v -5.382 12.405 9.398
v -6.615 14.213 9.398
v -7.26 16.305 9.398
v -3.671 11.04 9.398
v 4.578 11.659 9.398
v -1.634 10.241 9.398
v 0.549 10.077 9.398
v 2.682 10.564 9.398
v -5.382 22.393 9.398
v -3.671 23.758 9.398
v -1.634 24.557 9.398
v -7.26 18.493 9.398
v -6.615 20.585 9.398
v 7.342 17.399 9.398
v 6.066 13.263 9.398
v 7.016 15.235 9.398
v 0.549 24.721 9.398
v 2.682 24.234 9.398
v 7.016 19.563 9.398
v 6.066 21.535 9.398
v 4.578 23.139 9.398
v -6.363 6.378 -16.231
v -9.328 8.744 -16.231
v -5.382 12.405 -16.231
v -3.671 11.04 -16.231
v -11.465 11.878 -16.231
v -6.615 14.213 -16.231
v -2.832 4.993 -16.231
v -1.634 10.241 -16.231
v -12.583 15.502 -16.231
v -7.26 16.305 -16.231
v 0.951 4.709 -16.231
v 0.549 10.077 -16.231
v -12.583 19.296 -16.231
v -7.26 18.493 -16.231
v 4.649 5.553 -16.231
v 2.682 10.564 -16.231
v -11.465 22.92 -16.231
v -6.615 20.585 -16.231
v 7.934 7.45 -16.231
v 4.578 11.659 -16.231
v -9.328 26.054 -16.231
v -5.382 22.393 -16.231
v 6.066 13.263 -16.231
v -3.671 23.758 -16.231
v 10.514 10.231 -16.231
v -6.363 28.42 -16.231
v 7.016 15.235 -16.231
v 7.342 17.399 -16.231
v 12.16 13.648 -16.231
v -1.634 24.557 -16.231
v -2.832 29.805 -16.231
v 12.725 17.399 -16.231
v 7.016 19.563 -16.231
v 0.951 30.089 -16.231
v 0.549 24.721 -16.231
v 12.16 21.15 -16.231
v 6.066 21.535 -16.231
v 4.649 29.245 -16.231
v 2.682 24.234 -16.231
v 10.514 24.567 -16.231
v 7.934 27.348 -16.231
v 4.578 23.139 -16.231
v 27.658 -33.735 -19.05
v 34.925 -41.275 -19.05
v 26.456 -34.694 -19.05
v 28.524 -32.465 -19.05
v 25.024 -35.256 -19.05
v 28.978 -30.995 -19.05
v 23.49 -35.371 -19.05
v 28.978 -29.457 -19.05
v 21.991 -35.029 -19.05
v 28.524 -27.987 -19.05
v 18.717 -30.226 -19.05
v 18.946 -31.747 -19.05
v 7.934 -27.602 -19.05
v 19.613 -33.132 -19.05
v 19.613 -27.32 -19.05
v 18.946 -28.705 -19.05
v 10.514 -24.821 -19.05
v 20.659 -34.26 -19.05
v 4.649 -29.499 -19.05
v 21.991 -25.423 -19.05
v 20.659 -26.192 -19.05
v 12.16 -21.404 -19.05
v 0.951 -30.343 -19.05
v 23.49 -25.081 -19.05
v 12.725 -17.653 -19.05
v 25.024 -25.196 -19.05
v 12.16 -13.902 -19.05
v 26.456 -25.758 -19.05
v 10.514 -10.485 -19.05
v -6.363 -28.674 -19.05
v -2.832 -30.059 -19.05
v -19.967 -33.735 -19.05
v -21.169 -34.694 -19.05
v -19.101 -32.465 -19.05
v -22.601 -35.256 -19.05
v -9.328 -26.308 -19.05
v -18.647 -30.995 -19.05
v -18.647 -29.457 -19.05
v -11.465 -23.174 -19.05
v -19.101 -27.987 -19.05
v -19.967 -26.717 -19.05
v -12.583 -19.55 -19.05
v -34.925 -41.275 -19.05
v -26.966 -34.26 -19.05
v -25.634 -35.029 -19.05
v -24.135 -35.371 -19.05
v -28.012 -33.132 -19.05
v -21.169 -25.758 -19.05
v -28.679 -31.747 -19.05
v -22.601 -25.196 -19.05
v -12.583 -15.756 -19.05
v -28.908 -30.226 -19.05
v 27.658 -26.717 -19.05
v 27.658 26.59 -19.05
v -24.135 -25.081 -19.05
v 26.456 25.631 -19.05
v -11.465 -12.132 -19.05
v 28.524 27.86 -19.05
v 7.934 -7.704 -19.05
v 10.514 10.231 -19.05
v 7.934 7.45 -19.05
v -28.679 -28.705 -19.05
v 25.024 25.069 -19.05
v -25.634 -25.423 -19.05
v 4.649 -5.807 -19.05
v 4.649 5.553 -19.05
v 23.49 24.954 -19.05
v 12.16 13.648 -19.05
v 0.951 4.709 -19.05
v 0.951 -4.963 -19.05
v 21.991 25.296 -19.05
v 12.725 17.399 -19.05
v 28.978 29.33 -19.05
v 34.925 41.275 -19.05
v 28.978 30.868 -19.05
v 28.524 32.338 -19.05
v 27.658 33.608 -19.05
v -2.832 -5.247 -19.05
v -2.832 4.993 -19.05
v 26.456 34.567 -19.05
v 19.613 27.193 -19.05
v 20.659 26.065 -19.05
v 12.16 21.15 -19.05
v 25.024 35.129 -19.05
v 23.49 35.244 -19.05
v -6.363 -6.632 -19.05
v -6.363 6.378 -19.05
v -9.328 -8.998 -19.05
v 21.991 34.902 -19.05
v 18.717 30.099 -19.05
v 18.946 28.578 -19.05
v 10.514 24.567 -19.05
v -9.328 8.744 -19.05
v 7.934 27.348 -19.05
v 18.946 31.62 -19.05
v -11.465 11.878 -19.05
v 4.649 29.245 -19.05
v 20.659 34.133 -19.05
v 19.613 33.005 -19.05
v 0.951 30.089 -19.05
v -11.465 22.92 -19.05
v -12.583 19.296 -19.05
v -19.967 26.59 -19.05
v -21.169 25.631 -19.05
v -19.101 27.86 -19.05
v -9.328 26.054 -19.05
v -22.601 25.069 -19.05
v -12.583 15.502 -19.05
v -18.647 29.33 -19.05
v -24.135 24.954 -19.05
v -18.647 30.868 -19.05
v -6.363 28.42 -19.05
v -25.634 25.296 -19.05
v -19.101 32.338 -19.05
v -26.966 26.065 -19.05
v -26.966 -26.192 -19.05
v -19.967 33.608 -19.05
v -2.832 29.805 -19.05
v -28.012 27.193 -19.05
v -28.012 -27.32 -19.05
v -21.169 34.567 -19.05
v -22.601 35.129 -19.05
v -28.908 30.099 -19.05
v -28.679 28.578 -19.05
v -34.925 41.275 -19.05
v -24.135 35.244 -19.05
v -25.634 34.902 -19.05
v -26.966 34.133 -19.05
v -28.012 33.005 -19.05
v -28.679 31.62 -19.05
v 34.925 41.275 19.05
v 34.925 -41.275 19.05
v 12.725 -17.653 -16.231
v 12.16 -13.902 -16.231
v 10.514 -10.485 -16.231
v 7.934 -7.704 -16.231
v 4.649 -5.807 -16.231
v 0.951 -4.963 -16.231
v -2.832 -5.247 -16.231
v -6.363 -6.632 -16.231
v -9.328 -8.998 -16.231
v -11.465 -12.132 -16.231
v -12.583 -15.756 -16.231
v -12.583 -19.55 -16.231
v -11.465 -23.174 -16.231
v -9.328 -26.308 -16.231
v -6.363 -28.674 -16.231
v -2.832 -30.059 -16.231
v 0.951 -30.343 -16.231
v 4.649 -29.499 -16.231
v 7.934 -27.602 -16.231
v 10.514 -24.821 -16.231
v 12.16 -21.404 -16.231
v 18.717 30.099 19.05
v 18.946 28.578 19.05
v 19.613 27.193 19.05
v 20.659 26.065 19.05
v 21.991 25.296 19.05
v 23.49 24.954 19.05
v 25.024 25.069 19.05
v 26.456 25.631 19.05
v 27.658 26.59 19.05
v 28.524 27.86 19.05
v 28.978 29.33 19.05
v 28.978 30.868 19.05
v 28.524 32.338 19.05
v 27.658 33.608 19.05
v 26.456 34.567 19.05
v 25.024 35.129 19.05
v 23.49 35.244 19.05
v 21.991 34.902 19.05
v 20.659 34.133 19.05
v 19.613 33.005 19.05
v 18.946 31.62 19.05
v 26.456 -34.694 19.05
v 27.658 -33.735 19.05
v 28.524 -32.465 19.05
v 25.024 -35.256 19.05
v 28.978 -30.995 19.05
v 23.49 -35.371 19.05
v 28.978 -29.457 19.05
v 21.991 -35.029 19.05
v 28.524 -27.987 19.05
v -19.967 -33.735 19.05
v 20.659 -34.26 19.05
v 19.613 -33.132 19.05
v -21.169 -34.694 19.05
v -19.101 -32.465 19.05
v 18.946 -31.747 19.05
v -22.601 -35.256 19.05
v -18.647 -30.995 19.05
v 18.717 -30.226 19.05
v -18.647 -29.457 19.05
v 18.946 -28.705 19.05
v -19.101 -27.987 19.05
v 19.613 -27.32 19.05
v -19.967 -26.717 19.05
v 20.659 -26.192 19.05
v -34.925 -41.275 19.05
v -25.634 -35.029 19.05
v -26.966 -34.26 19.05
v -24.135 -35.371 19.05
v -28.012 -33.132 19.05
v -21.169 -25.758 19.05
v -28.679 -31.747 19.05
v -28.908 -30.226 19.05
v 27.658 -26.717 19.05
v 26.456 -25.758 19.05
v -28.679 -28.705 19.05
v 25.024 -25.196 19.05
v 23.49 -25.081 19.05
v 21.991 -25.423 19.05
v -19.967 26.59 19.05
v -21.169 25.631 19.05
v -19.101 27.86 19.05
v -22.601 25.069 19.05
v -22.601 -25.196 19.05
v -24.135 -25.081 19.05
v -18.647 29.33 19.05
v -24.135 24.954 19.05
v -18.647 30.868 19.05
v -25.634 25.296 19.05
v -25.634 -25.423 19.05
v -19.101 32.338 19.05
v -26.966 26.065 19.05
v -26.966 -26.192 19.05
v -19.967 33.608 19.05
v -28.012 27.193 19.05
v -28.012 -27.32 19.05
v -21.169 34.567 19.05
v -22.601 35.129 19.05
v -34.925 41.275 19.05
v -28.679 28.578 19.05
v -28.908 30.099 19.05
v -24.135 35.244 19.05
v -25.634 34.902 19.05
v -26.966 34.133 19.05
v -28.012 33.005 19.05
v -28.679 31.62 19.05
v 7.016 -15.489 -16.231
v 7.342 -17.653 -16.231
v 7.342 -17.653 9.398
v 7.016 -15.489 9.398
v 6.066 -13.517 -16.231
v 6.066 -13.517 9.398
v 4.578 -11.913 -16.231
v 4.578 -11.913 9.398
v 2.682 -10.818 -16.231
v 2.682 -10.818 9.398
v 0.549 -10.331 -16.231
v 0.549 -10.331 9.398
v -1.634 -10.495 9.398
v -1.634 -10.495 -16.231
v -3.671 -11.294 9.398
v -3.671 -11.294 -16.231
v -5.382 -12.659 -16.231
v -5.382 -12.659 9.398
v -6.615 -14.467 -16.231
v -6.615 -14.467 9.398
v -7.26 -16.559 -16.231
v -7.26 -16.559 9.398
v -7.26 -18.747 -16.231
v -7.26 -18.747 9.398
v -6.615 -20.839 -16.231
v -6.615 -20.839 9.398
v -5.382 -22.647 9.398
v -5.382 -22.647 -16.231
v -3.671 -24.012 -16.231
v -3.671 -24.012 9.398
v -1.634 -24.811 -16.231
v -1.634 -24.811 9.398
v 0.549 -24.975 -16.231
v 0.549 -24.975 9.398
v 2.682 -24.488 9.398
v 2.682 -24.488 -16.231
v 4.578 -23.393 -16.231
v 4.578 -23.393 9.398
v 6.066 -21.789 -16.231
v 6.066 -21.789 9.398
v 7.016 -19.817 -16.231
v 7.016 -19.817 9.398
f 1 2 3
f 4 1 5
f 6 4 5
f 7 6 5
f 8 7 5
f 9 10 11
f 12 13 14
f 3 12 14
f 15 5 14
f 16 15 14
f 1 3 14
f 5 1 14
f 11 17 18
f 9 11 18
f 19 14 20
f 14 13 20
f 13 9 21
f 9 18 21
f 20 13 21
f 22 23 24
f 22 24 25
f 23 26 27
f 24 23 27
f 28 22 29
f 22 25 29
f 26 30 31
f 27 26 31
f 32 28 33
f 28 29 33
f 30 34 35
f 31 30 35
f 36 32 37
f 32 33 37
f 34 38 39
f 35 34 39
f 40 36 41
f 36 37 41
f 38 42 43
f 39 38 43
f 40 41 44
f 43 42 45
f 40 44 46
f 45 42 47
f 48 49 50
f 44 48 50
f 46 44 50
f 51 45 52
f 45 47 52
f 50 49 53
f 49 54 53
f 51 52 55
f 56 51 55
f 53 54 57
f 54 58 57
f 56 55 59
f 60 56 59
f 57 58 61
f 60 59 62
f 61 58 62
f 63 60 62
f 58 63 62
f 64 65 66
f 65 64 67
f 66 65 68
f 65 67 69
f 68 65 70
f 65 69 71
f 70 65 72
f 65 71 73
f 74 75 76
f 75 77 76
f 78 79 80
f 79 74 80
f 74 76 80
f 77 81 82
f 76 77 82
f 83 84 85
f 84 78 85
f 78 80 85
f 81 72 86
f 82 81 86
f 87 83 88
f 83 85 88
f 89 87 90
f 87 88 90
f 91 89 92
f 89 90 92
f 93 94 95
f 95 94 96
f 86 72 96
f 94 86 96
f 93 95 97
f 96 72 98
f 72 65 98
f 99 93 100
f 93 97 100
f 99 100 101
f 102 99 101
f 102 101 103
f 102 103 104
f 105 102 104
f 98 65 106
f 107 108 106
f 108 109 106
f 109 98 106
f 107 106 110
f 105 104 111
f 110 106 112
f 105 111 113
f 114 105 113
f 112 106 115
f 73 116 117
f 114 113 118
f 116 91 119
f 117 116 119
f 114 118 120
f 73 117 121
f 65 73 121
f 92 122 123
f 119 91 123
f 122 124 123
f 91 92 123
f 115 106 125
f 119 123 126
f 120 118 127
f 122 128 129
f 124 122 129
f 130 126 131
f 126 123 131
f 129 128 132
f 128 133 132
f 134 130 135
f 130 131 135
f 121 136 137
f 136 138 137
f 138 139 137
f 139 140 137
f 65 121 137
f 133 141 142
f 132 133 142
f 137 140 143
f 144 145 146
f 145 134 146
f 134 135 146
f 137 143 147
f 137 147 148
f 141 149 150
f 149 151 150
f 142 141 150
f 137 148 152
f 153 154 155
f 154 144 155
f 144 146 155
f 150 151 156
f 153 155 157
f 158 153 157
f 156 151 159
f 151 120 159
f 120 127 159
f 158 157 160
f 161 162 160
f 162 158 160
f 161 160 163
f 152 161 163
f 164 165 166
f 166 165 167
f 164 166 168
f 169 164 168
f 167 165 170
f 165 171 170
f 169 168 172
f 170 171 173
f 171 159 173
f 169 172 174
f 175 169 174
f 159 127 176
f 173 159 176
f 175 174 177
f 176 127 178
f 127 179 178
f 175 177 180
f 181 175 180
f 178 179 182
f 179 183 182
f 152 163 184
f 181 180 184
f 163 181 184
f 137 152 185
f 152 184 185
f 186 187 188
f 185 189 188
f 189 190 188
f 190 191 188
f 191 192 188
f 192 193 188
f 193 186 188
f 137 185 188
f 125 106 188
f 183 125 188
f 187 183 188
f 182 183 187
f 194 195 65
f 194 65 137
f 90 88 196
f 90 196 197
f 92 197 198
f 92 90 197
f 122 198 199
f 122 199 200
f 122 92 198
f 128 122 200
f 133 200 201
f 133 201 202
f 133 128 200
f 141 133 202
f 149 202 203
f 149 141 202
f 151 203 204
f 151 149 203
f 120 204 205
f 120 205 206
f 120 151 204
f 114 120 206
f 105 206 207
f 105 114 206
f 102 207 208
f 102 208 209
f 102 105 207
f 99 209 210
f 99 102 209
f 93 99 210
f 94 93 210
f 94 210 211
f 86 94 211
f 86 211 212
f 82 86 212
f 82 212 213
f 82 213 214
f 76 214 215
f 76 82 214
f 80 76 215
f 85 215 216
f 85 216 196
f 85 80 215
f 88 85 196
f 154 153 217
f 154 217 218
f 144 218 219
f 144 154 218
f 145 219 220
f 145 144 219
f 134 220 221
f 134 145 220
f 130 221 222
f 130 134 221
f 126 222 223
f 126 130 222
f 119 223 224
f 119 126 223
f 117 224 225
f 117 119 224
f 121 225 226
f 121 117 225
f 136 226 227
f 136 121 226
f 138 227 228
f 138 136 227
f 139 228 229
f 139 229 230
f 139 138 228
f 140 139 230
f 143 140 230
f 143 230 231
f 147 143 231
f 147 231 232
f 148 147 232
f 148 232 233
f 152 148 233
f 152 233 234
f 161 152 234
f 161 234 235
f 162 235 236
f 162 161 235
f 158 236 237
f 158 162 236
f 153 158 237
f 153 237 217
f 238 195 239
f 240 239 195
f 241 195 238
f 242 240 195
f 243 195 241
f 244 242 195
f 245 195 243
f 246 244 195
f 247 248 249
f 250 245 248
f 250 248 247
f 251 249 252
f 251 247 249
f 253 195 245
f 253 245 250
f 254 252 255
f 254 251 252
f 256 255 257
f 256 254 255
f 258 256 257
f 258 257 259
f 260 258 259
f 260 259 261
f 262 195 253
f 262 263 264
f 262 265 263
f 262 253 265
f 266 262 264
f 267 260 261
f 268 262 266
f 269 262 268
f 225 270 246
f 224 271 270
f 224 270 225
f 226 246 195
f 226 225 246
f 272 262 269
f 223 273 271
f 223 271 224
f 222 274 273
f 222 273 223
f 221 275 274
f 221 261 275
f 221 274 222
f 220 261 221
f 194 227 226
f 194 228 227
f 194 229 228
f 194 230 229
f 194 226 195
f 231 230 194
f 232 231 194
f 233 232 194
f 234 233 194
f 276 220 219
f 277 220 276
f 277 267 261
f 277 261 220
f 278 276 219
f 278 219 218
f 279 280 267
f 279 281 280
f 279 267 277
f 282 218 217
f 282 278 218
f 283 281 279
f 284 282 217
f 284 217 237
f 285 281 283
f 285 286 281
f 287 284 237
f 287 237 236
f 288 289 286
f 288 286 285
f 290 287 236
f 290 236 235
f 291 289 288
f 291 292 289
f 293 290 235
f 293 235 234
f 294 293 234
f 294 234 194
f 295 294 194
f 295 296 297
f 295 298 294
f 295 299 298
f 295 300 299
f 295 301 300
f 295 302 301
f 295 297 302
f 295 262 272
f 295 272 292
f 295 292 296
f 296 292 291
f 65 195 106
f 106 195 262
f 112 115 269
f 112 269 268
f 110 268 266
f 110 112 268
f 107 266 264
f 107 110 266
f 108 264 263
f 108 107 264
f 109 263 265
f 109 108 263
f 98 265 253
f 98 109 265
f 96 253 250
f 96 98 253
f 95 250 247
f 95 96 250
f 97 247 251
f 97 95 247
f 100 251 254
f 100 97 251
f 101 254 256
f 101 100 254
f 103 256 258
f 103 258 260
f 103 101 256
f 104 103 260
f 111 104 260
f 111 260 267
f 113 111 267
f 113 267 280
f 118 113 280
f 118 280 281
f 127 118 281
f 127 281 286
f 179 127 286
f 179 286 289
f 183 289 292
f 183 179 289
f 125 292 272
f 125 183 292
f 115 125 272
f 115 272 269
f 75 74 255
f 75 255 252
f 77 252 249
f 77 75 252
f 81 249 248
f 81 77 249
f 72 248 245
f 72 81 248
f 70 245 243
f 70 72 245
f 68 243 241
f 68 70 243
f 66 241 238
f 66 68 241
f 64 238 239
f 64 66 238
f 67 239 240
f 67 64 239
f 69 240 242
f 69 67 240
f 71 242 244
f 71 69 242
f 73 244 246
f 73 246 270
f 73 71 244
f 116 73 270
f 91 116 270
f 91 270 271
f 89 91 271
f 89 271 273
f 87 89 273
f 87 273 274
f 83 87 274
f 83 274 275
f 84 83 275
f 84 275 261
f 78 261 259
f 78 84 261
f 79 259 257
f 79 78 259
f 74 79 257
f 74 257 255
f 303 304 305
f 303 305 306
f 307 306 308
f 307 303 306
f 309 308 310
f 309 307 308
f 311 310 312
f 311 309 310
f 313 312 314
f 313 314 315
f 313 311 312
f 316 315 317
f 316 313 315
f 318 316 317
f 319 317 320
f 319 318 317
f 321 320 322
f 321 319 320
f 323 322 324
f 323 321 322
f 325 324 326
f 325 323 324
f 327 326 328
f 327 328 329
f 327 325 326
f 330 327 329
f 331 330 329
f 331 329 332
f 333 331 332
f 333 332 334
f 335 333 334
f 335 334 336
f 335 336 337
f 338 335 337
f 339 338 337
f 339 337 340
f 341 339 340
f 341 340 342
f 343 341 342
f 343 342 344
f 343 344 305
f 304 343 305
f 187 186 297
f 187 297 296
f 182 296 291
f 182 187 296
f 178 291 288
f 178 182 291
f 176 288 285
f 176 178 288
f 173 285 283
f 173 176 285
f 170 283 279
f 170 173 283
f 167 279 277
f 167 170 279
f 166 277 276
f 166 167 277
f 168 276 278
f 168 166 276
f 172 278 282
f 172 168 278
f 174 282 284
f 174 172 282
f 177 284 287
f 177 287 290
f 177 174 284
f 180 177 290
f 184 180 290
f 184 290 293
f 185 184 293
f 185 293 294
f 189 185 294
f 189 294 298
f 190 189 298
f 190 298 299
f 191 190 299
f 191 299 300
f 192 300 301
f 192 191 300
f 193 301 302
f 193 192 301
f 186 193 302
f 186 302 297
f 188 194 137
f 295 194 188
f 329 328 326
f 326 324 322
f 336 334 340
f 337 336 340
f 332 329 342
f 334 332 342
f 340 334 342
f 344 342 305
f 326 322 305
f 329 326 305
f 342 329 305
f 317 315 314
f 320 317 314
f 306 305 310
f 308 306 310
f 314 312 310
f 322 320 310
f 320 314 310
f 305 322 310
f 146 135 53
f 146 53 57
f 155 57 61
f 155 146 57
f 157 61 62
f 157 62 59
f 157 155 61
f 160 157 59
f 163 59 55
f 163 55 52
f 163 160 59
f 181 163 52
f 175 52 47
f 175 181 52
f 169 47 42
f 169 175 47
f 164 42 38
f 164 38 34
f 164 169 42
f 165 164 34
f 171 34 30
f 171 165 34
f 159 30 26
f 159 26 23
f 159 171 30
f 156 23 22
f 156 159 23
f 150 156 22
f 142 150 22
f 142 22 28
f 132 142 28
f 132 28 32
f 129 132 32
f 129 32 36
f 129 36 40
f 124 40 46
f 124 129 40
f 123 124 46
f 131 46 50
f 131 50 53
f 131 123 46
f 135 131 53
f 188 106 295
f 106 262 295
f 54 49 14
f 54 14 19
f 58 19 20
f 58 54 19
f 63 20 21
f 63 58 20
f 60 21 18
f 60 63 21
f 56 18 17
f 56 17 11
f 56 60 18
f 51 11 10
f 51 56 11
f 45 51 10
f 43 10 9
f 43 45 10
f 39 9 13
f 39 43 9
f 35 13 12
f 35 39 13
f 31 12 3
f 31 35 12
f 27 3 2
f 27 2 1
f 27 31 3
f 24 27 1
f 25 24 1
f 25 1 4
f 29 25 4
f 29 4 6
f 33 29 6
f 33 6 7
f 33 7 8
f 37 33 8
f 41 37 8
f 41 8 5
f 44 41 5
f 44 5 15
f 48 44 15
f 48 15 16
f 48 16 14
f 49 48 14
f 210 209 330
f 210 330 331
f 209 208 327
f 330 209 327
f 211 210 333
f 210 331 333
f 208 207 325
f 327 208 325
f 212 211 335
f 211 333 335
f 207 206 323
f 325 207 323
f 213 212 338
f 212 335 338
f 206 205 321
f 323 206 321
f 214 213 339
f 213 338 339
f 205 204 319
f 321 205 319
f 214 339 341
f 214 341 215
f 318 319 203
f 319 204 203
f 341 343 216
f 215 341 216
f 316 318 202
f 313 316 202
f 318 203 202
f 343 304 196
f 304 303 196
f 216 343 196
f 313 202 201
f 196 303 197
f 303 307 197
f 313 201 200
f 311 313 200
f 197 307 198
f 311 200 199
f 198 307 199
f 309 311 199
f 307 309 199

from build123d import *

# Parameters (mm, degrees)
SKETCH1_W           = 82.55
SKETCH1_H           = 69.85
BOSS_EXTRUDE1_DEPTH = 19.05
CUT_EXTRUDE2_START  = -19.05
SKETCH2_R           = 5.159375
CUT_EXTRUDE2_DEPTH  = 38.1
CUT_EXTRUDE4_START  = -19.05
SKETCH3_R           = 5.159375
CUT_EXTRUDE4_DEPTH  = 38.1
CUT_EXTRUDE6_START  = -19.05
SKETCH4_R           = 7.3421875
CUT_EXTRUDE6_DEPTH  = 28.448
CUT_EXTRUDE8_START  = -19.05
SKETCH5_R           = 12.7254
CUT_EXTRUDE8_DEPTH  = 2.8194
CUT_EXTRUDE10_START = -19.05
SKETCH6_R           = 7.3421875
CUT_EXTRUDE10_DEPTH = 28.448
CUT_EXTRUDE12_START = -19.05
SKETCH7_R           = 12.7254
CUT_EXTRUDE12_DEPTH = 2.8194


with BuildPart() as part:
    # Sketch1 → Boss-Extrude1 (new, symmetric)
    with BuildSketch(Plane(origin=(0, 0, 0), x_dir=(0, 1, 0), z_dir=(0, 0, 1))):
        Rectangle(SKETCH1_W, SKETCH1_H)
    extrude(amount=BOSS_EXTRUDE1_DEPTH, both=True)

    # Sketch2 → Cut-Extrude2 (cut)
    with BuildSketch(Plane(origin=(0, 0, 0), x_dir=(0, 1, 0), z_dir=(0, 0, 1)).offset(CUT_EXTRUDE2_START)):
        with Locations(Location((-30.226, -23.876, 0), (0, 0, 90))):
            Circle(SKETCH2_R)
    extrude(amount=CUT_EXTRUDE2_DEPTH, mode=Mode.SUBTRACT)

    # Sketch3 → Cut-Extrude4 (cut)
    with BuildSketch(Plane(origin=(0, 0, 0), x_dir=(0, 1, 0), z_dir=(0, 0, 1)).offset(CUT_EXTRUDE4_START)):
        with Locations(Location((30.099, -23.876, 0), (0, 0, 90))):
            Circle(SKETCH3_R)
        with Locations(Location((-30.226, 23.749, 0), (0, 0, 90))):
            Circle(SKETCH3_R)
        with Locations(Location((30.099, 23.749, 0), (0, 0, 90))):
            Circle(SKETCH3_R)
    extrude(amount=CUT_EXTRUDE4_DEPTH, mode=Mode.SUBTRACT)

    # Sketch4 → Cut-Extrude6 (cut)
    with BuildSketch(Plane(origin=(0, 0, 0), x_dir=(0, 1, 0), z_dir=(0, 0, 1)).offset(CUT_EXTRUDE6_START)):
        with Locations(Location((-17.653, 0, 0), (0, 0, 270))):
            Circle(SKETCH4_R)
    extrude(amount=CUT_EXTRUDE6_DEPTH, mode=Mode.SUBTRACT)

    # Sketch5 → Cut-Extrude8 (cut)
    with BuildSketch(Plane(origin=(0, 0, 0), x_dir=(0, 1, 0), z_dir=(0, 0, 1)).offset(CUT_EXTRUDE8_START)):
        with Locations(Location((-17.653, 0, 0), (0, 0, 270))):
            Circle(SKETCH5_R)
    extrude(amount=CUT_EXTRUDE8_DEPTH, mode=Mode.SUBTRACT)

    # Sketch6 → Cut-Extrude10 (cut)
    with BuildSketch(Plane(origin=(0, 0, 0), x_dir=(0, 1, 0), z_dir=(0, 0, 1)).offset(CUT_EXTRUDE10_START)):
        with Locations(Location((17.399, 0, 0), (0, 0, 270))):
            Circle(SKETCH6_R)
    extrude(amount=CUT_EXTRUDE10_DEPTH, mode=Mode.SUBTRACT)

    # Sketch7 → Cut-Extrude12 (cut)
    with BuildSketch(Plane(origin=(0, 0, 0), x_dir=(0, 1, 0), z_dir=(0, 0, 1)).offset(CUT_EXTRUDE12_START)):
        with Locations(Location((17.399, 0, 0), (0, 0, 270))):
            Circle(SKETCH7_R)
    extrude(amount=CUT_EXTRUDE12_DEPTH, mode=Mode.SUBTRACT)


solid = part.part
